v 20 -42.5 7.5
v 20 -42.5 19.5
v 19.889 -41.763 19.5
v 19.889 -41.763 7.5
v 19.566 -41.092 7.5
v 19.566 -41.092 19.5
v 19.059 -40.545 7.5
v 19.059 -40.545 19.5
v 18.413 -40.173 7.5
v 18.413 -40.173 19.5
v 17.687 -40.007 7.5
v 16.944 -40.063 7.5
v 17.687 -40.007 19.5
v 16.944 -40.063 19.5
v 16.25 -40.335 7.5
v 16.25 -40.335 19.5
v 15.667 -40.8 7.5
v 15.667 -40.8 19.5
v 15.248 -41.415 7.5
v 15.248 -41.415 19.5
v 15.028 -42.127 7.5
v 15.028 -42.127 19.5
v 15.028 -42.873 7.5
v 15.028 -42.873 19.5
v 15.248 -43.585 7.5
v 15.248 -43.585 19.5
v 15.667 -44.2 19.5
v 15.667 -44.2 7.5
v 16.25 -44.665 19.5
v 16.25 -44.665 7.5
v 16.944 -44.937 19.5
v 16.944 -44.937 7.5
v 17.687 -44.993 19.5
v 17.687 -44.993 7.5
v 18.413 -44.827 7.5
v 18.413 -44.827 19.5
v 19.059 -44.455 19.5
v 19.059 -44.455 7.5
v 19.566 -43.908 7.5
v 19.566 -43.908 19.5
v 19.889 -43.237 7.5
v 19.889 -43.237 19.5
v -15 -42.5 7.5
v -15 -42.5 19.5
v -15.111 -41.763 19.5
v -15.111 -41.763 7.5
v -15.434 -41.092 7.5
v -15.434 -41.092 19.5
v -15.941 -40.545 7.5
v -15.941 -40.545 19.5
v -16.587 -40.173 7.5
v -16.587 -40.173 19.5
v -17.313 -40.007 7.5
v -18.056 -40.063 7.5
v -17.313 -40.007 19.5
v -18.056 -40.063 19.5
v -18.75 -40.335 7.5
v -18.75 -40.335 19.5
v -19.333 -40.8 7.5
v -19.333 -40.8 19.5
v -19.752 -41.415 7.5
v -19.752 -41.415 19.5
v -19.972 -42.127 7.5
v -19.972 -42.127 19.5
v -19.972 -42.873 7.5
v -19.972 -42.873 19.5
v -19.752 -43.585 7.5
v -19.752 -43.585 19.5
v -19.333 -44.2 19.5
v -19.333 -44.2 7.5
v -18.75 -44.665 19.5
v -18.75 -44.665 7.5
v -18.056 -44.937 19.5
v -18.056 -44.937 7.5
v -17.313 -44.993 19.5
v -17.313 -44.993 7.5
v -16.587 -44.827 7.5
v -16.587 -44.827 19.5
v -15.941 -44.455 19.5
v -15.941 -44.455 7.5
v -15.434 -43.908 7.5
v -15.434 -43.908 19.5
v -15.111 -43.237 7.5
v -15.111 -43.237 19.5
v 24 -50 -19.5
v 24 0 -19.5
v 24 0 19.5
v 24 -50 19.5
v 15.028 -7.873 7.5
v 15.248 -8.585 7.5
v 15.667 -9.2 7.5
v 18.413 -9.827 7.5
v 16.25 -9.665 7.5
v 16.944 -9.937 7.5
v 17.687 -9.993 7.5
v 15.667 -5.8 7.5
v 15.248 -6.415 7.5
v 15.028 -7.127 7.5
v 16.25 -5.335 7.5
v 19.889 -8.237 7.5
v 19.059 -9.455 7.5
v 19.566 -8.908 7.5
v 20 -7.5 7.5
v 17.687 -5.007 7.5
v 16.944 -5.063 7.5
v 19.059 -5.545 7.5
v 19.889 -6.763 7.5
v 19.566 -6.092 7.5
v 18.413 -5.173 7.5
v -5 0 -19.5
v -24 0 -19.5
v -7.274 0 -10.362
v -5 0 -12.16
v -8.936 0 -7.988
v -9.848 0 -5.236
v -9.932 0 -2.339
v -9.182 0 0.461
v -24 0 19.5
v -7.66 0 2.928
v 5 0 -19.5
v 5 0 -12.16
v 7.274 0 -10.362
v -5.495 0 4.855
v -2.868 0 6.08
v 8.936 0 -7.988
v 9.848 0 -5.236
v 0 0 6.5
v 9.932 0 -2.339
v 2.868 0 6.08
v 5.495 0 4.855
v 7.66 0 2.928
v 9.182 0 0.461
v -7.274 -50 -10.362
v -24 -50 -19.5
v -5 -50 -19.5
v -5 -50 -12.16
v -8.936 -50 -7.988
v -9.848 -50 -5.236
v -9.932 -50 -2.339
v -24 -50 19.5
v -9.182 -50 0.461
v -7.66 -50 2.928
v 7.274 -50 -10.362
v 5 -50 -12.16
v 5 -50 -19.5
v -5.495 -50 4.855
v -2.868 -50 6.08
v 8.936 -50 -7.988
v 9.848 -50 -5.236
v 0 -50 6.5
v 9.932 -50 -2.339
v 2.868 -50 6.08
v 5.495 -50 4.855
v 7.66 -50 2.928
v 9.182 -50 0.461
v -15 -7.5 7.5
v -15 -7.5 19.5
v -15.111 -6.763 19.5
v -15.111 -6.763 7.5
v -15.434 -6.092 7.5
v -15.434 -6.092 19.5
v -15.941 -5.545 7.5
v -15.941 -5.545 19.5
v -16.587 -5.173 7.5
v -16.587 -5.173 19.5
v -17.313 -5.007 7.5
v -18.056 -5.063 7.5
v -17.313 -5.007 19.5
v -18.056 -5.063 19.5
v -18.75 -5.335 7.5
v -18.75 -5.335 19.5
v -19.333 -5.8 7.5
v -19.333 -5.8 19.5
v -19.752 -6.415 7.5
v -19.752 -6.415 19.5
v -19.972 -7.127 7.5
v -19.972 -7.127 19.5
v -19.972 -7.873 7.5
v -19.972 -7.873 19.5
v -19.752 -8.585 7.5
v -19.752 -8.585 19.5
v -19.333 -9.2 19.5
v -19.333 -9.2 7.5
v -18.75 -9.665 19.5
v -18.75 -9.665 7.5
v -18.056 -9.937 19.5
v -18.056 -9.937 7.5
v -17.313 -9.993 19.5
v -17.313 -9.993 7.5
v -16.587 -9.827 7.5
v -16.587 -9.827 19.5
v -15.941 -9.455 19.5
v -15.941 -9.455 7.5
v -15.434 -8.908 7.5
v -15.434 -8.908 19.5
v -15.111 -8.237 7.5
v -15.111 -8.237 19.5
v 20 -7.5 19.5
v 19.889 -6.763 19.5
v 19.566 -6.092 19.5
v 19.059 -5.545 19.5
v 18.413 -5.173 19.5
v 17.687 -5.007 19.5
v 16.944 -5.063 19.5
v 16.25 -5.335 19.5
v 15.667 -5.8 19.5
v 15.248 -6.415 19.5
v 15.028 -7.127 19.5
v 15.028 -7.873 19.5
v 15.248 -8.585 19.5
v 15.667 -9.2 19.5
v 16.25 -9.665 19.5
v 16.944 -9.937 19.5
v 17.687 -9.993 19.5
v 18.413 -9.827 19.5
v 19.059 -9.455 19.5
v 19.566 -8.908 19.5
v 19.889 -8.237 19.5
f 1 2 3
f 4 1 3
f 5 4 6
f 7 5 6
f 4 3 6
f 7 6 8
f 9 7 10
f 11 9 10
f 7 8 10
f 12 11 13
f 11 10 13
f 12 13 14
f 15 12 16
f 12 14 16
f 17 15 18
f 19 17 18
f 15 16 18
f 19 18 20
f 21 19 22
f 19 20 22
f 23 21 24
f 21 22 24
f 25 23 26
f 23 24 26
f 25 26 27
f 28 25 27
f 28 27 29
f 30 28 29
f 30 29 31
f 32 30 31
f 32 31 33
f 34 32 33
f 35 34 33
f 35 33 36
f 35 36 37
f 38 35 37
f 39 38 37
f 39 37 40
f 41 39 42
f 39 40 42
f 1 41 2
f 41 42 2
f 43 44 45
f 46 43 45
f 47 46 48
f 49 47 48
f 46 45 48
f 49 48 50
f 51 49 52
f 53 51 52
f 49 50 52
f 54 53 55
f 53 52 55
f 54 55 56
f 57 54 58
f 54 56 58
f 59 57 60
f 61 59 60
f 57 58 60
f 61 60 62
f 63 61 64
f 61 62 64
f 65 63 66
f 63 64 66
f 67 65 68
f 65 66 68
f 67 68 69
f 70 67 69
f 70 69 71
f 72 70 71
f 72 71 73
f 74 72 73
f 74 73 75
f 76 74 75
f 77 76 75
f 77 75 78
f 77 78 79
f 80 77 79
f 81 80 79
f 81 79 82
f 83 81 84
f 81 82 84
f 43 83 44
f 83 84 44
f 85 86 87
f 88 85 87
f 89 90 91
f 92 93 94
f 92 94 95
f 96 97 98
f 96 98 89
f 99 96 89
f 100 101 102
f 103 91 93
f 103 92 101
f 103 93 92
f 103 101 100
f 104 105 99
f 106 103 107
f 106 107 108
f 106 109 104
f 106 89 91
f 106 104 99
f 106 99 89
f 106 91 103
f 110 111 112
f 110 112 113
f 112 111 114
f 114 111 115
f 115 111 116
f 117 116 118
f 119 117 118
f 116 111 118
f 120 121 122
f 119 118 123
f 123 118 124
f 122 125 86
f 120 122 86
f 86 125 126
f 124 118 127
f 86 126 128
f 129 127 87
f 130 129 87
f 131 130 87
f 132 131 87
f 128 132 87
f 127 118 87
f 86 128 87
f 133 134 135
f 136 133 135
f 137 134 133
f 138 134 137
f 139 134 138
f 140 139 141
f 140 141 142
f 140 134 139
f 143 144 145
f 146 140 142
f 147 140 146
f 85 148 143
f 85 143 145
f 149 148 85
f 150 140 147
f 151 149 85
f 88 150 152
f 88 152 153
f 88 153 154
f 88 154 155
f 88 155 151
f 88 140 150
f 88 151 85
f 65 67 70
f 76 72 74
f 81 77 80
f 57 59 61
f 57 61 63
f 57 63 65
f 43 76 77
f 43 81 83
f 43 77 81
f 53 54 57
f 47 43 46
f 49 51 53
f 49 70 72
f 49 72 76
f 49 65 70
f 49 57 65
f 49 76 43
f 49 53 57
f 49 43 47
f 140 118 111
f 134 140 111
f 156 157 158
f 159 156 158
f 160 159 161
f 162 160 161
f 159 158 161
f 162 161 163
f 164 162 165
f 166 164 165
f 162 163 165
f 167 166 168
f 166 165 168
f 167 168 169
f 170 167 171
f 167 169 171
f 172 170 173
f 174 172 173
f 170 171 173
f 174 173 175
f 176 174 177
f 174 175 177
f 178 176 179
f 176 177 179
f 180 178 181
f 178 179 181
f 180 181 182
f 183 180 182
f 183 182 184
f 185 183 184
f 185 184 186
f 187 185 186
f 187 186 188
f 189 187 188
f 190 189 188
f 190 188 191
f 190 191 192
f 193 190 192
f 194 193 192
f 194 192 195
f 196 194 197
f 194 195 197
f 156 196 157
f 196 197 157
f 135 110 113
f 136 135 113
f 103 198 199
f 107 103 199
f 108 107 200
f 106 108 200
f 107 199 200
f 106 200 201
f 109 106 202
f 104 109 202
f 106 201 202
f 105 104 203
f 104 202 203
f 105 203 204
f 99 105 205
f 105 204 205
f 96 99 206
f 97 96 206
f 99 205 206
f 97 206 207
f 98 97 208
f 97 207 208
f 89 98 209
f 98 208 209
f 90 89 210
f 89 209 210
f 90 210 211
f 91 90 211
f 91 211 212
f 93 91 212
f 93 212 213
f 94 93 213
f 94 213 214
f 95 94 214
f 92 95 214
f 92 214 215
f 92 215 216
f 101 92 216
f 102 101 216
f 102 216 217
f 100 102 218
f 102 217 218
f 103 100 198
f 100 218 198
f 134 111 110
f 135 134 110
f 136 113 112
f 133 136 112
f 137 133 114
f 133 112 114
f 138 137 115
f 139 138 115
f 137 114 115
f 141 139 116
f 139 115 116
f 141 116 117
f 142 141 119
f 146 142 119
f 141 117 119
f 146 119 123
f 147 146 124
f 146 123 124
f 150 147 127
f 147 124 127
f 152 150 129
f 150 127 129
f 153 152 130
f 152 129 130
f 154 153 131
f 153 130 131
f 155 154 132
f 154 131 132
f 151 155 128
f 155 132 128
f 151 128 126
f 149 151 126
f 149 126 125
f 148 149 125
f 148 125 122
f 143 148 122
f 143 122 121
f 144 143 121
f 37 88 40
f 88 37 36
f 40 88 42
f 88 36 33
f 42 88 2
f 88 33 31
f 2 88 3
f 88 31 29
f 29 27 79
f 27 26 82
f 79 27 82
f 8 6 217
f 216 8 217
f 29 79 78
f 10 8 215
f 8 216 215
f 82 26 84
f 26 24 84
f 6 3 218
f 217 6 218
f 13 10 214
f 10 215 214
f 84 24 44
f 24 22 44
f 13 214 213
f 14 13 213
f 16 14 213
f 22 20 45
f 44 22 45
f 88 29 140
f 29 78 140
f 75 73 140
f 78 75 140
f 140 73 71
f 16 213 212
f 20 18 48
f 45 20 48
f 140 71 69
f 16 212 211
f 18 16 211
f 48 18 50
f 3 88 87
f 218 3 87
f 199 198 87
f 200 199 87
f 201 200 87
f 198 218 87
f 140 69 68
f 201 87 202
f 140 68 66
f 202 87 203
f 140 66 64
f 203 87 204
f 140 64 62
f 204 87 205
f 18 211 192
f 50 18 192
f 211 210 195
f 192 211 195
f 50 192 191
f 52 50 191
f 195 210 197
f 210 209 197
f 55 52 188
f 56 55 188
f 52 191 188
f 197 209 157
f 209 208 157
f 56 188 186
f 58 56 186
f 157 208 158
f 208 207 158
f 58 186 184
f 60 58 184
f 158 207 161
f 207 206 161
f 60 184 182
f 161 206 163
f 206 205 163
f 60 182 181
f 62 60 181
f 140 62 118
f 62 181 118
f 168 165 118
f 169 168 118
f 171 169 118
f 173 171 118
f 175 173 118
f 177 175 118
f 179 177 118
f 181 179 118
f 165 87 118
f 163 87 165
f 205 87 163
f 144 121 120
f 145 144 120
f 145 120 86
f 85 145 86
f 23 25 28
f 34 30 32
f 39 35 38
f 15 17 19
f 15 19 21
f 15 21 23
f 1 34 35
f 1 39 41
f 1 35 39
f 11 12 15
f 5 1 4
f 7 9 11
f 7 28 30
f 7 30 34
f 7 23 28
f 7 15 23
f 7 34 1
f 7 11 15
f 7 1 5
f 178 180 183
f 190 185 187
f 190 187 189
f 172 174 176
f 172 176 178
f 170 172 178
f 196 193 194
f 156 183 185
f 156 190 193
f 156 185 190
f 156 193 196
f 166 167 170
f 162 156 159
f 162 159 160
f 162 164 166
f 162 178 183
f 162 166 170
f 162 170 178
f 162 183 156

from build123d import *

# Parameters (mm, degrees)
F1_DEPTH = 50
F2_R     = 2.5
F3_DEPTH = 12


with BuildPart() as f1:
    # F0 (on Front) → F1 (new body)
    with BuildSketch(Plane.XZ):
        with BuildLine():
            Line((24, -19.5), (24, 19.5))
            Line((24, 19.5), (-24, 19.5))
            Line((-24, 19.5), (-24, -19.5))
            Line((-24, -19.5), (-5, -19.5))
            Line((-5, -19.5), (-5, -12.160254))
            ThreePointArc((-5, -12.160254), (0, 6.5), (5, -12.160254))
            Line((5, -12.160254), (5, -19.5))
            Line((5, -19.5), (24, -19.5))
        make_face()
    extrude(amount=F1_DEPTH)

    # F2 (on face) → F3 (cut)
    with BuildSketch(Plane.XY.offset(19.5)):
        with Locations((-17.5, -42.5)):
            Circle(F2_R)
        with Locations((-17.5, -7.5)):
            Circle(F2_R)
        with Locations((17.5, -7.5)):
            Circle(F2_R)
        with Locations((17.5, -42.5)):
            Circle(F2_R)
    extrude(amount=-F3_DEPTH, mode=Mode.SUBTRACT)


solid = f1.part
